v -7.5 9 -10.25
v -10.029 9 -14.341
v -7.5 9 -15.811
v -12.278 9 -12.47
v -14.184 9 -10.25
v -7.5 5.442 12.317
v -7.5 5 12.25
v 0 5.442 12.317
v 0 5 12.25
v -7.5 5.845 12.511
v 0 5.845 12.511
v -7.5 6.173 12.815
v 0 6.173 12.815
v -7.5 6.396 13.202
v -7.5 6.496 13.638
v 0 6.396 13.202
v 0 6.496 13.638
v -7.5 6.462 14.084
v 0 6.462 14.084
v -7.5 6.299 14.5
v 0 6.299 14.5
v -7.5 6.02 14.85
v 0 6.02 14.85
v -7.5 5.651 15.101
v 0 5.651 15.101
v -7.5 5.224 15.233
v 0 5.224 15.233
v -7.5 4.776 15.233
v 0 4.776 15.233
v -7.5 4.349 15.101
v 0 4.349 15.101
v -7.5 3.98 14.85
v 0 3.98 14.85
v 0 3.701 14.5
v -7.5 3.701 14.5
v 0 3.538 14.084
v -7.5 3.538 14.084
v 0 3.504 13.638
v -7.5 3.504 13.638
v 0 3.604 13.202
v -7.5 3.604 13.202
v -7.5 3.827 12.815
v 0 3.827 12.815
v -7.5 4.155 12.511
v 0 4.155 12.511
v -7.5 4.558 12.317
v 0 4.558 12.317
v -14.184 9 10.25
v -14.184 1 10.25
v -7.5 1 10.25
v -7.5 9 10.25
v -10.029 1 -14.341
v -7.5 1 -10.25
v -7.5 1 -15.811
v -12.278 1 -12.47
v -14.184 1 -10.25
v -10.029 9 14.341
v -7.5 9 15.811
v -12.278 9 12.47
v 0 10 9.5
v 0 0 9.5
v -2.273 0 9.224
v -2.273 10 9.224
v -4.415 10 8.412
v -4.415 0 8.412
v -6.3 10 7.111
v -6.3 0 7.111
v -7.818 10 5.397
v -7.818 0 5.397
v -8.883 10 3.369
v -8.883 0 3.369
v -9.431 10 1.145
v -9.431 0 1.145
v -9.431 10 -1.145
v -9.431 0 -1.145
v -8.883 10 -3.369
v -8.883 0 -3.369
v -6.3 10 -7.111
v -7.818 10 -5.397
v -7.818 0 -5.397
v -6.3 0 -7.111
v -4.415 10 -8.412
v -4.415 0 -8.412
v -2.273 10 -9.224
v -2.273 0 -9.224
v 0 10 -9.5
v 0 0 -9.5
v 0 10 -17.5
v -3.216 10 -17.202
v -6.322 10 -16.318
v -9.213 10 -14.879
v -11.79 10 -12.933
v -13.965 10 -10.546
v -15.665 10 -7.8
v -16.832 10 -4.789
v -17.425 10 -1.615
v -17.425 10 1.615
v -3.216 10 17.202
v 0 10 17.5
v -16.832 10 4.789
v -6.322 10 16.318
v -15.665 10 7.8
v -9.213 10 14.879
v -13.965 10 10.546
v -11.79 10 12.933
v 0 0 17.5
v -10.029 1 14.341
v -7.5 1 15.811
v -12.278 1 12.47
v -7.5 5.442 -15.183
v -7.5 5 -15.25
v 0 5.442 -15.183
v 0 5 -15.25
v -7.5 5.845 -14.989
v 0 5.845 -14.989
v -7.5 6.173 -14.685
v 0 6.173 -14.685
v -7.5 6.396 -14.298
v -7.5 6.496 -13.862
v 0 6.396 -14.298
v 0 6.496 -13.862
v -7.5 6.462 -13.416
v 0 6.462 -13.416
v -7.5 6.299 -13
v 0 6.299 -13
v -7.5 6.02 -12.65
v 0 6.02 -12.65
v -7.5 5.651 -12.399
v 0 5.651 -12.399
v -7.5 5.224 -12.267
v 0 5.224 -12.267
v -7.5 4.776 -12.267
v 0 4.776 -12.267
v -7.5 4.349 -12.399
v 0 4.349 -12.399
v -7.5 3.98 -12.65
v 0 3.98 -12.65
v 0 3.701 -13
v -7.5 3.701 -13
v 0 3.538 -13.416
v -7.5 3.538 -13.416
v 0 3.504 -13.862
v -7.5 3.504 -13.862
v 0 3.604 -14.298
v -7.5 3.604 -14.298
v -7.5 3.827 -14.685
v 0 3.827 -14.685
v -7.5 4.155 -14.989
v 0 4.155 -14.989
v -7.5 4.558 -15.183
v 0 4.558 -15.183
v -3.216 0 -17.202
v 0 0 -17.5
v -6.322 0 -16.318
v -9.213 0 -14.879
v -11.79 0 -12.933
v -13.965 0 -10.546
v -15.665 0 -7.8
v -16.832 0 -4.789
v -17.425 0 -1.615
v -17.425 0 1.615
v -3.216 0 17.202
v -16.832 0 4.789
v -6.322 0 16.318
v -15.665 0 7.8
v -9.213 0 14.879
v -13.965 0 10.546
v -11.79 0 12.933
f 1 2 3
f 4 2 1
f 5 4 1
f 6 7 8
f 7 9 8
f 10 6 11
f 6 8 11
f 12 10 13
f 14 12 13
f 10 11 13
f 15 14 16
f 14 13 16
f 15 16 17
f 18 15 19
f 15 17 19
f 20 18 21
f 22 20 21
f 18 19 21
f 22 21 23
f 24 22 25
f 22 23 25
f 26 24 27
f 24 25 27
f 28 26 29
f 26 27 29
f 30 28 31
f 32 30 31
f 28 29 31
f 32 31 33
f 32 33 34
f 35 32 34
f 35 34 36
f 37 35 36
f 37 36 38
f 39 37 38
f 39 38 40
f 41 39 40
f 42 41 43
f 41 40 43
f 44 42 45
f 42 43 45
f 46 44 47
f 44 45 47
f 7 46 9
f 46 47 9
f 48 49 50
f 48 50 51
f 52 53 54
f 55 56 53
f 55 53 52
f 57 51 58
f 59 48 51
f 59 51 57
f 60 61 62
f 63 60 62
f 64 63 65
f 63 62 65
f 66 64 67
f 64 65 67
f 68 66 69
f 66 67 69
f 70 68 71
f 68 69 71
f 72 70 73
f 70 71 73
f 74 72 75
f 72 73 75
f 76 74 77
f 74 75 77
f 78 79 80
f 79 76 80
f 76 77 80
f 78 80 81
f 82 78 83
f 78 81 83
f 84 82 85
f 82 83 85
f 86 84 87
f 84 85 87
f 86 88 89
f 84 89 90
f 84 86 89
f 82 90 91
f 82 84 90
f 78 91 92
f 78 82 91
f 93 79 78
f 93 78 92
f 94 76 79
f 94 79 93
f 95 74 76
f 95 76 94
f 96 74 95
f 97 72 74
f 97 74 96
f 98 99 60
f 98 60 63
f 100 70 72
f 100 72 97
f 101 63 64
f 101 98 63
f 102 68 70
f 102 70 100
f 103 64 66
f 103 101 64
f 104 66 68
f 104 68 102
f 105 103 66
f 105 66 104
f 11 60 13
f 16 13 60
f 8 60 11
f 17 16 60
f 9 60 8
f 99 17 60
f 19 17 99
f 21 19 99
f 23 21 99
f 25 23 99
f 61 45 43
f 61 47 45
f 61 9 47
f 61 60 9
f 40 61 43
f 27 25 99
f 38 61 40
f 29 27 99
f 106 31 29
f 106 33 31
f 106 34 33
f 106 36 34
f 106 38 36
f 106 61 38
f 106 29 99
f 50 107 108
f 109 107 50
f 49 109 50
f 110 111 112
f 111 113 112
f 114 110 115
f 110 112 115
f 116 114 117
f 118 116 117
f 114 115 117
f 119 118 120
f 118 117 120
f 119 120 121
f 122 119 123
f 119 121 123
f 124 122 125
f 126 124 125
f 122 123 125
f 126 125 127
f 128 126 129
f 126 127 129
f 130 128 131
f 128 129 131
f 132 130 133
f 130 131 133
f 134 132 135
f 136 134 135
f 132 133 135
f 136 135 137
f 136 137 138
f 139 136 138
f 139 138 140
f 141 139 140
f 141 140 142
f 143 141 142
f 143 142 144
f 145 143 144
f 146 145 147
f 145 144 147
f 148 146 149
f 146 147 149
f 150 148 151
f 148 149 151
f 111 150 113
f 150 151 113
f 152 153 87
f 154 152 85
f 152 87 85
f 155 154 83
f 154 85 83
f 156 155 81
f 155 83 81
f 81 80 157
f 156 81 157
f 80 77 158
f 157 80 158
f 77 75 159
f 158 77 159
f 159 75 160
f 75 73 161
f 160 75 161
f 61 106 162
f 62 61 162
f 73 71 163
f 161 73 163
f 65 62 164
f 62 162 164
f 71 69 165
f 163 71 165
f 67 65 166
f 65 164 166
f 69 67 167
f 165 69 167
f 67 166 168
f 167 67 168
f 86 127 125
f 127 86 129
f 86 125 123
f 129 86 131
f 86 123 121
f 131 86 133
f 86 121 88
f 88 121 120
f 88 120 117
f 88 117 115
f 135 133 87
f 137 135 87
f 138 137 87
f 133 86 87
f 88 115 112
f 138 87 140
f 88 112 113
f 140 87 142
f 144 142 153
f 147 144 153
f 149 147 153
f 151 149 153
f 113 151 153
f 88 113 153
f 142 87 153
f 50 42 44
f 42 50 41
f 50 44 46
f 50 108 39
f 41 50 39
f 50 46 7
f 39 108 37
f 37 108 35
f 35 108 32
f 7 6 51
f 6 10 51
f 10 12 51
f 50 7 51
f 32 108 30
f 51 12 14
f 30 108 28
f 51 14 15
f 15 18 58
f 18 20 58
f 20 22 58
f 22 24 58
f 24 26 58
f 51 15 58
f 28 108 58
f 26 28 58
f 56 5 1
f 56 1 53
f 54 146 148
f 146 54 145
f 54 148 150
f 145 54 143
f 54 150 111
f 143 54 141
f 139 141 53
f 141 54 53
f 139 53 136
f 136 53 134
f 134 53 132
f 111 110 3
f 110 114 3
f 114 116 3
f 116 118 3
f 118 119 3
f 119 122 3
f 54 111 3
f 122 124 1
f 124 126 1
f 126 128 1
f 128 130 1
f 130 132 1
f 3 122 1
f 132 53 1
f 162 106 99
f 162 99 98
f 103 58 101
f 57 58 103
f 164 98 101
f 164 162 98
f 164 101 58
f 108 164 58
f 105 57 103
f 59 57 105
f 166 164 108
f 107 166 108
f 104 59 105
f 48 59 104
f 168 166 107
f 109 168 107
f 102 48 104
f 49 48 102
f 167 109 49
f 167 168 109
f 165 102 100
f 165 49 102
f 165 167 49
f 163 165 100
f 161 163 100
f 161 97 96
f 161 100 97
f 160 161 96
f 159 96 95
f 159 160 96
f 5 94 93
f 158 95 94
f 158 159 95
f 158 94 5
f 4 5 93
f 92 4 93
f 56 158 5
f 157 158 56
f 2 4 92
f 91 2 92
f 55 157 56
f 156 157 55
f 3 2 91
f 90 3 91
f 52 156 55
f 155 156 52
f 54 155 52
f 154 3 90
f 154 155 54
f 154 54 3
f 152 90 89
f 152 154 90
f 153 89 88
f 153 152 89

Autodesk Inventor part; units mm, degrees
ref_plane "YZ Plane" through (0, 0, 0) normal (1, 0, 0) x (0, 1, 0)
ref_plane "XZ Plane" through (0, 0, 0) normal (0, 1, 0) x (-1, 0, 0)
sketch "Эскиз1" plane through (0, 0, 0) normal (0, 1, 0) x (-1, 0, 0)
  circle A0 centre (0, 0) radius 9.5
  line L0 (0, -9.5) -> (0, -17.5)
  arc A1 (-7.7, -15.715) -> (-7.7, 15.715) centre (0, 0) ccw
  line L1 (0, 9.5) -> (0, 17.5)
  point P0 (0, -10)
extrude "Выдавливание1" add sketch "Эскиз1" along normal blind 10 contours A0 L1 A1 L0
sketch "Эскиз2" plane through (0, 0, 17.5) normal (1, 0, 0) x (0, 0, -1)
  circle A0 centre (3.75, 5) radius 1.5 projected
  circle A1 centre (31.25, 5) radius 1.5 projected
  point P0 (17.5, 0)
extrude "Выдавливание2" cut sketch "Эскиз2" against normal through all
ref_plane "РабПлоскость1" through (-17.5, 0, 0) normal (1, 0, 0) x (0, 1, 0)
sketch "Эскиз3" plane through (-17.5, 0, 0) normal (1, 0, 0) x (0, 1, 0)
  line L0 (1, -17.25) -> (9, -17.25)
  line L1 (9, -17.25) -> (9, -10.25)
  line L2 (9, -10.25) -> (1, -10.25)
  line L3 (1, -10.25) -> (1, -17.25)
  circle A0 centre (5, -13.75) radius 1.5 projected
  line L4 (1, -17.25) -> (9, -10.25) construction
  line L5 (9, -17.25) -> (1, -10.25) construction
  line L6 (1, 10.25) -> (9, 10.25)
  line L7 (9, 10.25) -> (9, 17.25)
  line L8 (9, 17.25) -> (1, 17.25)
  line L9 (1, 17.25) -> (1, 10.25)
  circle A1 centre (5, 13.75) radius 1.5 projected
  line L10 (1, 10.25) -> (9, 17.25) construction
  line L11 (9, 10.25) -> (1, 17.25) construction
  point P0 (0, 0)
  dimension "d4" = 8
  dimension "d5" = 7
  dimension "d6" = 8
  dimension "d7" = 7
extrude "Выдавливание3" cut sketch "Эскиз3" along normal blind 10 contours L3 L2 L1 L0 | A0 | L9 L8 L7 L6 | A1
equation "\"d6\" = d4"
equation "\"d7\" = d5"
properties part number "000.402 - Зажим подшипника" material "Пластик АБС"
